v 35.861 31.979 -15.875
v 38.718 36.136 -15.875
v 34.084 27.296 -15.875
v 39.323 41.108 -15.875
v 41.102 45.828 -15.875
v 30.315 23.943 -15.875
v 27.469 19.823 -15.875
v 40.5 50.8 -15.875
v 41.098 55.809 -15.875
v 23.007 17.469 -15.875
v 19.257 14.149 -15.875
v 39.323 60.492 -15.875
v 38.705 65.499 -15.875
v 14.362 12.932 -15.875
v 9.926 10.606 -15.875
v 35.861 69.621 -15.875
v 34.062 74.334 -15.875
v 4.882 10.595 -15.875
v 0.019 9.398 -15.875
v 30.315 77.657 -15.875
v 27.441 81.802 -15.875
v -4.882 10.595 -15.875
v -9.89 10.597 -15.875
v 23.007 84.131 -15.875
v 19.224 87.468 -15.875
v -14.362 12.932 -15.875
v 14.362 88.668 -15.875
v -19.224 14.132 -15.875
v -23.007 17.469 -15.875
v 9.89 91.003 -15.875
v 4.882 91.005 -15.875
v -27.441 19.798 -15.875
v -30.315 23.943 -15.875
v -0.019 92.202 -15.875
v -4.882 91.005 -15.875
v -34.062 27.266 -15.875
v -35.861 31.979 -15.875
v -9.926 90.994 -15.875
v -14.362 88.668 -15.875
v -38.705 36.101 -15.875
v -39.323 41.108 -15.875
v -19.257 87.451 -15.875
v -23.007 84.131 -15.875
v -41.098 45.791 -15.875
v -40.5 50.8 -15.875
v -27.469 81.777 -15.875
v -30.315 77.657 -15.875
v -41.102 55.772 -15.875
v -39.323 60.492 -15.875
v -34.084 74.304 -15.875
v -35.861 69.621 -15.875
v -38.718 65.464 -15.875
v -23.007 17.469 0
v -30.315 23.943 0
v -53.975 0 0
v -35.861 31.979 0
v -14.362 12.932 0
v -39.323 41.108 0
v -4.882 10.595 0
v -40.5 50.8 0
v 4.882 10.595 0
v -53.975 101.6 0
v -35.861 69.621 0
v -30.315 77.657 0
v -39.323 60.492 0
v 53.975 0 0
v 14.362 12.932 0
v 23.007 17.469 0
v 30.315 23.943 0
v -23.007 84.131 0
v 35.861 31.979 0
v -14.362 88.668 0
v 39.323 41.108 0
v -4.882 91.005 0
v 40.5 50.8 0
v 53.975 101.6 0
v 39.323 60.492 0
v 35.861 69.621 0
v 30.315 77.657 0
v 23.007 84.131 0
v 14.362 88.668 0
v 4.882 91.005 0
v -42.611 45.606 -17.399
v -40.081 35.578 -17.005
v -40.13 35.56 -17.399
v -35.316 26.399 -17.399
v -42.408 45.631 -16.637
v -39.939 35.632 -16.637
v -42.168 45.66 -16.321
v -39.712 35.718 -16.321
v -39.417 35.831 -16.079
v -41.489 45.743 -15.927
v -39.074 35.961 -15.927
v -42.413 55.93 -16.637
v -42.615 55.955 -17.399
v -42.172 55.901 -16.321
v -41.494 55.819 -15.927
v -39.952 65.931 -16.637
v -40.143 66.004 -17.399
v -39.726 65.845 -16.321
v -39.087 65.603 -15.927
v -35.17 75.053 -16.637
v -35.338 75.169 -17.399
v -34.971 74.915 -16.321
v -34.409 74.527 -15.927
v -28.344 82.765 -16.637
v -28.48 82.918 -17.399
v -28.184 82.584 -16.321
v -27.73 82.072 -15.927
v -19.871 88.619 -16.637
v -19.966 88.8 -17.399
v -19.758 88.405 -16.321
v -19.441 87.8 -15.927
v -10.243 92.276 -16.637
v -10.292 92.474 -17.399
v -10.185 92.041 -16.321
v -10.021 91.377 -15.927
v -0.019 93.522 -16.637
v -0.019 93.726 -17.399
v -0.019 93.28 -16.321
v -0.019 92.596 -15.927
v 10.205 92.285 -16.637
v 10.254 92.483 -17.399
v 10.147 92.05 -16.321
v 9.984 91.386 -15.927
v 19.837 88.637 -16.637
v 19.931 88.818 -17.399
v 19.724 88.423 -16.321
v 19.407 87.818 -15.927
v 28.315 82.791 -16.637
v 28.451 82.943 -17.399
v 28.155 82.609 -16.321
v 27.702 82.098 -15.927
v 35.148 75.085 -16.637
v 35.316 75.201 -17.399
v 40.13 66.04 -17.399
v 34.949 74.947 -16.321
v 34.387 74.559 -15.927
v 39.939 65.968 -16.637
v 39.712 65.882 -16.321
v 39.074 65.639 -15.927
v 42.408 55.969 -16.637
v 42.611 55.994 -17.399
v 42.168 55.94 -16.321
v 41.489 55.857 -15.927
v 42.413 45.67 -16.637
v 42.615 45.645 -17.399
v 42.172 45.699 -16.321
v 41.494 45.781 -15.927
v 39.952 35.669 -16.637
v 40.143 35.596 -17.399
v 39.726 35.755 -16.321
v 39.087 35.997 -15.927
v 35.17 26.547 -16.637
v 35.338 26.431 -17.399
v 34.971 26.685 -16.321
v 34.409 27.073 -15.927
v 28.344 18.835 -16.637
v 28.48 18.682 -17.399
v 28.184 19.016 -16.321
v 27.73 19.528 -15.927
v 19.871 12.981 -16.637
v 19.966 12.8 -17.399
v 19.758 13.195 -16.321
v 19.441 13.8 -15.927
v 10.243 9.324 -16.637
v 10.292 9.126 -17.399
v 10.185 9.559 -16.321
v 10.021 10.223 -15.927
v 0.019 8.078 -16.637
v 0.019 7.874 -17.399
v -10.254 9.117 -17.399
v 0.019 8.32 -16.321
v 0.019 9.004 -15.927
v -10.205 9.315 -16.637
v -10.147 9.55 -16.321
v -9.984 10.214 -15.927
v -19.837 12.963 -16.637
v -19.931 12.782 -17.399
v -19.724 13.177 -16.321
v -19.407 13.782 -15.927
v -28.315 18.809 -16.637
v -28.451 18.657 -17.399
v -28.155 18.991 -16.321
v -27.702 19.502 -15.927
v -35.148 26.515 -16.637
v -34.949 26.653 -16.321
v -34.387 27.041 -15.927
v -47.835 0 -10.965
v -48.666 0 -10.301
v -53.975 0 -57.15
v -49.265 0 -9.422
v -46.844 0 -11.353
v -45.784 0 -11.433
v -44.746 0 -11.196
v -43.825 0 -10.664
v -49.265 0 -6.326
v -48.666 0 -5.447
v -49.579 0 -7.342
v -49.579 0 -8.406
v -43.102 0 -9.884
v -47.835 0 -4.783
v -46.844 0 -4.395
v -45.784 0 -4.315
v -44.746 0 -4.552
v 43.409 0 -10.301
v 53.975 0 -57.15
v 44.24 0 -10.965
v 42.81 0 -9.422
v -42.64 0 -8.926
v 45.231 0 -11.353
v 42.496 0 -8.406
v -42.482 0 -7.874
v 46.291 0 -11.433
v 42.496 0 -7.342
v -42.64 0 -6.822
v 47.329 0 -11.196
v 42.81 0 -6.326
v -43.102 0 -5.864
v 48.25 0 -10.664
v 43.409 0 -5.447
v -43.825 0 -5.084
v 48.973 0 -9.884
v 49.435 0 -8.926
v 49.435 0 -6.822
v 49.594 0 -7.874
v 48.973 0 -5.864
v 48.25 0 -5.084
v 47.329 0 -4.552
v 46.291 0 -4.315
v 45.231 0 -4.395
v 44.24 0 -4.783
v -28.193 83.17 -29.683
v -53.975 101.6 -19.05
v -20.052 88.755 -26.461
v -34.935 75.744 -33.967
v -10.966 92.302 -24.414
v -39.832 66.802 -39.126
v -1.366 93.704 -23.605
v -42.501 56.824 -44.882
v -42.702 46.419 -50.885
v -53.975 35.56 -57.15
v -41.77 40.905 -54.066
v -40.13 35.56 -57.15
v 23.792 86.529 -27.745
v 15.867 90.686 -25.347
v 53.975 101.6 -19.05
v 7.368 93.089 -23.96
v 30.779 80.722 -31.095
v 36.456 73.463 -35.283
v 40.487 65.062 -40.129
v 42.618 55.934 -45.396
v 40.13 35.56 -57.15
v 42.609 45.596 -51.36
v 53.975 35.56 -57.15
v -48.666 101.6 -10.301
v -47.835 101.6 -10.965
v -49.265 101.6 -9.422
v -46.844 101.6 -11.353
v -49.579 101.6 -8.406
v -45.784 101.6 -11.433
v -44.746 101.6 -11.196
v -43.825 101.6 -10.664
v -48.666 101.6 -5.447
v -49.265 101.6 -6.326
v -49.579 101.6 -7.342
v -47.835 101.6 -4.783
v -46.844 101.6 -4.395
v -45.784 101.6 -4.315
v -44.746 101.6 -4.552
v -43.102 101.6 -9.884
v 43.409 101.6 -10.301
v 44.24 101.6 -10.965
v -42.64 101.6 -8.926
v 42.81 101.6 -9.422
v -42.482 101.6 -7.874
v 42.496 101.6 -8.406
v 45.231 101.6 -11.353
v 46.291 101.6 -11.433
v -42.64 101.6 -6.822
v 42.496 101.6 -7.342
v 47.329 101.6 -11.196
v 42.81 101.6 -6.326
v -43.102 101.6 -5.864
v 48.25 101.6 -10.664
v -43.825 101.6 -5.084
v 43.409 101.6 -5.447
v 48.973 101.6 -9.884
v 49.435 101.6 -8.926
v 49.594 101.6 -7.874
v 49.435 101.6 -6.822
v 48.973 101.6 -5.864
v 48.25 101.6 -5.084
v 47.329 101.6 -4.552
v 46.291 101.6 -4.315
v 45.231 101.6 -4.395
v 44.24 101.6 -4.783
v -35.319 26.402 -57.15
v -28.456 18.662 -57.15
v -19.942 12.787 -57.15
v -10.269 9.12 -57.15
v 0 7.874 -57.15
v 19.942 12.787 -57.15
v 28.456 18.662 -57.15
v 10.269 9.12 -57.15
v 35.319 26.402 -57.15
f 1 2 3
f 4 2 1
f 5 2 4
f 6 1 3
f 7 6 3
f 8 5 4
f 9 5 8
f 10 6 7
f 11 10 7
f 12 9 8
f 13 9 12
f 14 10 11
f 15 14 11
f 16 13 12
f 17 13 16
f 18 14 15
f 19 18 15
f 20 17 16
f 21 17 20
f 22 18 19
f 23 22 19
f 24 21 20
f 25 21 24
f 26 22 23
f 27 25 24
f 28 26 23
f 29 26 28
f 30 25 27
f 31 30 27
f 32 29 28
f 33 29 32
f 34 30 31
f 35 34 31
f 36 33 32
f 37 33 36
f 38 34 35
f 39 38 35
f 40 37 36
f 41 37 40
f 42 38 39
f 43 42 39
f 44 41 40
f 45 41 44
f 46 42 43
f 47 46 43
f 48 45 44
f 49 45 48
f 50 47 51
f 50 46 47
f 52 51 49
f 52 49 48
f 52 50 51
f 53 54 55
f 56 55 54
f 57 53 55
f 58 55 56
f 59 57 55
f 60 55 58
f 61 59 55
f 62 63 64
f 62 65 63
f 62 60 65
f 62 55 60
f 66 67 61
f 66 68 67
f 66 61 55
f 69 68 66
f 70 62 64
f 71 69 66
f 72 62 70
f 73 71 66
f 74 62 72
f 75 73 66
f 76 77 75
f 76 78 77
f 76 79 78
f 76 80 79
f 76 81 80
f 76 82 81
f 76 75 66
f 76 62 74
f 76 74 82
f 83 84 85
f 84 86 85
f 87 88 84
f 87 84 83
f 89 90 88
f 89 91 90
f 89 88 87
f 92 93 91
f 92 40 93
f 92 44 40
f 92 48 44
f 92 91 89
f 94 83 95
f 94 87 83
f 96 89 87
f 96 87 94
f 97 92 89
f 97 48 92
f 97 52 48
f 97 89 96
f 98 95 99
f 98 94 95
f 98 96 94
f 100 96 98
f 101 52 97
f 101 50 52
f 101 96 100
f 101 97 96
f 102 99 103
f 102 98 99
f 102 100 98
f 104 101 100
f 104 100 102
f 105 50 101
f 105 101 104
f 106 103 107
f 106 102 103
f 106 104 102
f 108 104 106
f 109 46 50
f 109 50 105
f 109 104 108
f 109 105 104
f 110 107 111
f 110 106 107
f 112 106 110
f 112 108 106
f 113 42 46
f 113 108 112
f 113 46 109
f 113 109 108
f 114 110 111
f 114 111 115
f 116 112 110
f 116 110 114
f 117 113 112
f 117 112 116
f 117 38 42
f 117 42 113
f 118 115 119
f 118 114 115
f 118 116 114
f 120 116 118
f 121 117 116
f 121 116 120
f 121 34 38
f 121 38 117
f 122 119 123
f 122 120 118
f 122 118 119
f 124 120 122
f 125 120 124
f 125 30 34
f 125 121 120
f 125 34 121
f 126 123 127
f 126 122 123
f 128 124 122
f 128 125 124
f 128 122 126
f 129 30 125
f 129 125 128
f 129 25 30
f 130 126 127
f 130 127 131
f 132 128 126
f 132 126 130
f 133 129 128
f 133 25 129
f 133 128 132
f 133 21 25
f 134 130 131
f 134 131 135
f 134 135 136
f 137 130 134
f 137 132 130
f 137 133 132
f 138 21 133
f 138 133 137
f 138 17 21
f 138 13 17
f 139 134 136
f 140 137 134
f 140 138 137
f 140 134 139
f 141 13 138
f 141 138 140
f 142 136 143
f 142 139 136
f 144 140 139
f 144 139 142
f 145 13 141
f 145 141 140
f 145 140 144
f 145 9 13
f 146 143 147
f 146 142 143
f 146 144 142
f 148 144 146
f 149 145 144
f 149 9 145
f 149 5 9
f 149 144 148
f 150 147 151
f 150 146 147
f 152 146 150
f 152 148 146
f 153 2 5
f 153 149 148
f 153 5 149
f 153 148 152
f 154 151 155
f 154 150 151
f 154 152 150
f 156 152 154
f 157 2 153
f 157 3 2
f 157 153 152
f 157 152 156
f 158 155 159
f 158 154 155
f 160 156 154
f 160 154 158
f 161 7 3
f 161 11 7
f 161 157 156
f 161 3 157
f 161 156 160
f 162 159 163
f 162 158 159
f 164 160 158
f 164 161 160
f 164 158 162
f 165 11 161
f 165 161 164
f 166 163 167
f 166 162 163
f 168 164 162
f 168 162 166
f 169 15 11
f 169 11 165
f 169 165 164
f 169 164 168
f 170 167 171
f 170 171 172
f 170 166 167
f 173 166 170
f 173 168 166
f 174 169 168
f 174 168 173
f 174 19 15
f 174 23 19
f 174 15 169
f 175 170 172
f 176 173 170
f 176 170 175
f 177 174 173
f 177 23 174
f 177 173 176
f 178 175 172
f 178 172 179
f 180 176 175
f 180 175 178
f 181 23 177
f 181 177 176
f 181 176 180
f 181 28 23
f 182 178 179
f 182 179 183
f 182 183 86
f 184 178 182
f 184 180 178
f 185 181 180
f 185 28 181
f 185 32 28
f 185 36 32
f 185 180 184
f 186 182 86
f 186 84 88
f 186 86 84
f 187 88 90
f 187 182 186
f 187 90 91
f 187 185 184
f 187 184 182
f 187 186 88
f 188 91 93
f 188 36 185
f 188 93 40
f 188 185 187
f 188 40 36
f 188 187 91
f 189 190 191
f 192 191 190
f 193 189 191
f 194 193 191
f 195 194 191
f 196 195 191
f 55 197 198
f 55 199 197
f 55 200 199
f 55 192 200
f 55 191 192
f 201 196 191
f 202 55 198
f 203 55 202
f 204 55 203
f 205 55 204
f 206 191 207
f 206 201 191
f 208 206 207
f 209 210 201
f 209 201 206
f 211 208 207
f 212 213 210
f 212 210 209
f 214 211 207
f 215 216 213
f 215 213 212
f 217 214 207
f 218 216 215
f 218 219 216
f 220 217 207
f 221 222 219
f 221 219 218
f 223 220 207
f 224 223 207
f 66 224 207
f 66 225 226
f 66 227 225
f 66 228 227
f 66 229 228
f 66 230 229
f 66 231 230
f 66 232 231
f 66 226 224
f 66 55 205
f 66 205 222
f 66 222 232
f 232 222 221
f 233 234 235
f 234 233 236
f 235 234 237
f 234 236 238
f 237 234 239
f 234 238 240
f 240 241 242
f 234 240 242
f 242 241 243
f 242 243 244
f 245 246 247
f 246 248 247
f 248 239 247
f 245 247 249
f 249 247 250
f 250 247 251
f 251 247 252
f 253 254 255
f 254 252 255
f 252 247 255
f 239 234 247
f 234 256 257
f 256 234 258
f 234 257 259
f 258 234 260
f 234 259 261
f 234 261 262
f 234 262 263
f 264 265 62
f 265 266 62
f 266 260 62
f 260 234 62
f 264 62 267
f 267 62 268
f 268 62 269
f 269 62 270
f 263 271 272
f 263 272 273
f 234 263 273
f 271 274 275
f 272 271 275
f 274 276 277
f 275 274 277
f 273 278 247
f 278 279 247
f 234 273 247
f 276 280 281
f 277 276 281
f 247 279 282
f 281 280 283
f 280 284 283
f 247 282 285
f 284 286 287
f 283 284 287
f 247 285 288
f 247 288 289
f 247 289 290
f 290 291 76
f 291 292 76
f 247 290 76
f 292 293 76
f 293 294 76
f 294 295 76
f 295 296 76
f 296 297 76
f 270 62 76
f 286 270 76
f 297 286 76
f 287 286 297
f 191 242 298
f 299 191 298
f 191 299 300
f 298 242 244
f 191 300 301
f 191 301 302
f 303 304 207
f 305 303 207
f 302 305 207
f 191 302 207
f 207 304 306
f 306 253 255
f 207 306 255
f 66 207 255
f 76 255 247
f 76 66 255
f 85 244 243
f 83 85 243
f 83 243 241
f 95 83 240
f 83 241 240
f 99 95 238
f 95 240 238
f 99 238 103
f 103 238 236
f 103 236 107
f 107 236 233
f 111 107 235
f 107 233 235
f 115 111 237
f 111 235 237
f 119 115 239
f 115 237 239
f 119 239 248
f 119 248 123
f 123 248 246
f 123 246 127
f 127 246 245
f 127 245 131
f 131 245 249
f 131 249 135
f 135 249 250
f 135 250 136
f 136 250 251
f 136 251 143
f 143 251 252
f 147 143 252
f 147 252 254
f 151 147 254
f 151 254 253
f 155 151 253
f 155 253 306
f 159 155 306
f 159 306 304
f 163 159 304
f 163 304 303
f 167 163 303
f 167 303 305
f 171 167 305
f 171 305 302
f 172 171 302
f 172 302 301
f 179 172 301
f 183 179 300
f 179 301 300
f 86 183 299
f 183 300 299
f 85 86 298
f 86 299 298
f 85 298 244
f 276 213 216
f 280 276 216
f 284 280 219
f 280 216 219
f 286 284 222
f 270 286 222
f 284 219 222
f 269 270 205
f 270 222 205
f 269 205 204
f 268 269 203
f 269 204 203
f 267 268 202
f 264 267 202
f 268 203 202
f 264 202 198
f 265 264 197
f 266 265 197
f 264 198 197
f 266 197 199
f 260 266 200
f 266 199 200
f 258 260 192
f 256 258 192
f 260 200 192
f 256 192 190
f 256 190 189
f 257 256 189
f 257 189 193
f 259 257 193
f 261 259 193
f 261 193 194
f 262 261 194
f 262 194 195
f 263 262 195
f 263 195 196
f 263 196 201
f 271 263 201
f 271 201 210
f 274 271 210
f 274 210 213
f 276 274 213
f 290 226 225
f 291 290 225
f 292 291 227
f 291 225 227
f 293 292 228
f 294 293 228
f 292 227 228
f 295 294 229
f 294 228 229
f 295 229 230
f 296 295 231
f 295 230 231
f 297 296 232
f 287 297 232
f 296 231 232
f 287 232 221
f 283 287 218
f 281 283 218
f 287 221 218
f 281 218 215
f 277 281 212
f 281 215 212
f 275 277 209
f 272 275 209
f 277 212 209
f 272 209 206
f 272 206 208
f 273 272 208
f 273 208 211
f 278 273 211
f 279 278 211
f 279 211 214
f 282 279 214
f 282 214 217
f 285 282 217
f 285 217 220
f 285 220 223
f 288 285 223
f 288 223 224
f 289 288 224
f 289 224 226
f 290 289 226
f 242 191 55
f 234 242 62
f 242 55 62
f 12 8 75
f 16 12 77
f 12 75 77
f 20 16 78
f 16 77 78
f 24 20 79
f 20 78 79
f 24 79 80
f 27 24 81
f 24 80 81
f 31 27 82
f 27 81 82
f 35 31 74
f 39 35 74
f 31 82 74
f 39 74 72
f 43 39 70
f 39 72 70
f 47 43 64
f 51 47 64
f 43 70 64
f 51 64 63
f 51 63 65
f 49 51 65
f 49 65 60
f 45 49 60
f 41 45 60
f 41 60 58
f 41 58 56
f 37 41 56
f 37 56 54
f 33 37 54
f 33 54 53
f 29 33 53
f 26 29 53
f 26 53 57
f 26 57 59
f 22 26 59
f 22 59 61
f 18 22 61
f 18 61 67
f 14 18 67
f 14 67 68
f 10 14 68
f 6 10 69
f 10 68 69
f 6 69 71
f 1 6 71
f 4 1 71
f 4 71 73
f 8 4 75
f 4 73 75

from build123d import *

# Parameters (mm, degrees)
SKETCH1_W          = 107.95
SKETCH1_H          = 101.6
SKETCH1_R          = 40.5003
EXTRUDE1_DEPTH     = 57.15
CUT_EXTRUDE1_DEPTH = 108.95
SKETCH3_R          = 42.926
CUT_EXTRUDE2_DEPTH = 41.275
FILLET1_R          = 1.524
HOLE1_D            = 7.1374
HOLE1_DEPTH        = 101.6


with BuildPart() as part:
    # Sketch1 → Extrude1 (new body)
    with BuildSketch(Plane.XY):
        with Locations((0, 50.8)):
            Rectangle(SKETCH1_W, SKETCH1_H)
        with Locations((0, 50.8)):
            Circle(SKETCH1_R, mode=Mode.SUBTRACT)
    extrude(amount=-EXTRUDE1_DEPTH)

    # Sketch2 → Cut-Extrude1 (cut, through all)
    with BuildSketch(Plane(origin=(53.975, 0, 0), x_dir=(0, 0, -1), z_dir=(1, 0, 0))):
        Polygon((19.05, 101.6), (57.15, 35.56), (57.15, 101.6), align=None)
    extrude(amount=-CUT_EXTRUDE1_DEPTH, mode=Mode.SUBTRACT)

    # Sketch3 → Cut-Extrude2 (cut)
    with BuildSketch(Plane(origin=(0, 0, -57.15), x_dir=(-1, 0, 0), z_dir=(0, 0, -1))):
        with Locations(Location((0, 50.8, 0), (0, 0, 339.204742364))):  # turned: the seam where the file's is
            Circle(SKETCH3_R)
    extrude(amount=-CUT_EXTRUDE2_DEPTH, mode=Mode.SUBTRACT)

    # Fillet1
    fillet1_edges = [part.edges().sort_by_distance(p)[0] for p in [
        (40.129588535, 66.04, -15.875),
    ]]
    fillet(fillet1_edges, radius=FILLET1_R)

    # Hole1
    with Locations(Plane(origin=(0, 101.6, 0), x_dir=(-1, 0, 0), z_dir=(0, 1, 0))):
        with Locations((46.0502, -7.874), (-46.0248, -7.874)):
            Hole(HOLE1_D / 2, depth=HOLE1_DEPTH)


solid = part.part
